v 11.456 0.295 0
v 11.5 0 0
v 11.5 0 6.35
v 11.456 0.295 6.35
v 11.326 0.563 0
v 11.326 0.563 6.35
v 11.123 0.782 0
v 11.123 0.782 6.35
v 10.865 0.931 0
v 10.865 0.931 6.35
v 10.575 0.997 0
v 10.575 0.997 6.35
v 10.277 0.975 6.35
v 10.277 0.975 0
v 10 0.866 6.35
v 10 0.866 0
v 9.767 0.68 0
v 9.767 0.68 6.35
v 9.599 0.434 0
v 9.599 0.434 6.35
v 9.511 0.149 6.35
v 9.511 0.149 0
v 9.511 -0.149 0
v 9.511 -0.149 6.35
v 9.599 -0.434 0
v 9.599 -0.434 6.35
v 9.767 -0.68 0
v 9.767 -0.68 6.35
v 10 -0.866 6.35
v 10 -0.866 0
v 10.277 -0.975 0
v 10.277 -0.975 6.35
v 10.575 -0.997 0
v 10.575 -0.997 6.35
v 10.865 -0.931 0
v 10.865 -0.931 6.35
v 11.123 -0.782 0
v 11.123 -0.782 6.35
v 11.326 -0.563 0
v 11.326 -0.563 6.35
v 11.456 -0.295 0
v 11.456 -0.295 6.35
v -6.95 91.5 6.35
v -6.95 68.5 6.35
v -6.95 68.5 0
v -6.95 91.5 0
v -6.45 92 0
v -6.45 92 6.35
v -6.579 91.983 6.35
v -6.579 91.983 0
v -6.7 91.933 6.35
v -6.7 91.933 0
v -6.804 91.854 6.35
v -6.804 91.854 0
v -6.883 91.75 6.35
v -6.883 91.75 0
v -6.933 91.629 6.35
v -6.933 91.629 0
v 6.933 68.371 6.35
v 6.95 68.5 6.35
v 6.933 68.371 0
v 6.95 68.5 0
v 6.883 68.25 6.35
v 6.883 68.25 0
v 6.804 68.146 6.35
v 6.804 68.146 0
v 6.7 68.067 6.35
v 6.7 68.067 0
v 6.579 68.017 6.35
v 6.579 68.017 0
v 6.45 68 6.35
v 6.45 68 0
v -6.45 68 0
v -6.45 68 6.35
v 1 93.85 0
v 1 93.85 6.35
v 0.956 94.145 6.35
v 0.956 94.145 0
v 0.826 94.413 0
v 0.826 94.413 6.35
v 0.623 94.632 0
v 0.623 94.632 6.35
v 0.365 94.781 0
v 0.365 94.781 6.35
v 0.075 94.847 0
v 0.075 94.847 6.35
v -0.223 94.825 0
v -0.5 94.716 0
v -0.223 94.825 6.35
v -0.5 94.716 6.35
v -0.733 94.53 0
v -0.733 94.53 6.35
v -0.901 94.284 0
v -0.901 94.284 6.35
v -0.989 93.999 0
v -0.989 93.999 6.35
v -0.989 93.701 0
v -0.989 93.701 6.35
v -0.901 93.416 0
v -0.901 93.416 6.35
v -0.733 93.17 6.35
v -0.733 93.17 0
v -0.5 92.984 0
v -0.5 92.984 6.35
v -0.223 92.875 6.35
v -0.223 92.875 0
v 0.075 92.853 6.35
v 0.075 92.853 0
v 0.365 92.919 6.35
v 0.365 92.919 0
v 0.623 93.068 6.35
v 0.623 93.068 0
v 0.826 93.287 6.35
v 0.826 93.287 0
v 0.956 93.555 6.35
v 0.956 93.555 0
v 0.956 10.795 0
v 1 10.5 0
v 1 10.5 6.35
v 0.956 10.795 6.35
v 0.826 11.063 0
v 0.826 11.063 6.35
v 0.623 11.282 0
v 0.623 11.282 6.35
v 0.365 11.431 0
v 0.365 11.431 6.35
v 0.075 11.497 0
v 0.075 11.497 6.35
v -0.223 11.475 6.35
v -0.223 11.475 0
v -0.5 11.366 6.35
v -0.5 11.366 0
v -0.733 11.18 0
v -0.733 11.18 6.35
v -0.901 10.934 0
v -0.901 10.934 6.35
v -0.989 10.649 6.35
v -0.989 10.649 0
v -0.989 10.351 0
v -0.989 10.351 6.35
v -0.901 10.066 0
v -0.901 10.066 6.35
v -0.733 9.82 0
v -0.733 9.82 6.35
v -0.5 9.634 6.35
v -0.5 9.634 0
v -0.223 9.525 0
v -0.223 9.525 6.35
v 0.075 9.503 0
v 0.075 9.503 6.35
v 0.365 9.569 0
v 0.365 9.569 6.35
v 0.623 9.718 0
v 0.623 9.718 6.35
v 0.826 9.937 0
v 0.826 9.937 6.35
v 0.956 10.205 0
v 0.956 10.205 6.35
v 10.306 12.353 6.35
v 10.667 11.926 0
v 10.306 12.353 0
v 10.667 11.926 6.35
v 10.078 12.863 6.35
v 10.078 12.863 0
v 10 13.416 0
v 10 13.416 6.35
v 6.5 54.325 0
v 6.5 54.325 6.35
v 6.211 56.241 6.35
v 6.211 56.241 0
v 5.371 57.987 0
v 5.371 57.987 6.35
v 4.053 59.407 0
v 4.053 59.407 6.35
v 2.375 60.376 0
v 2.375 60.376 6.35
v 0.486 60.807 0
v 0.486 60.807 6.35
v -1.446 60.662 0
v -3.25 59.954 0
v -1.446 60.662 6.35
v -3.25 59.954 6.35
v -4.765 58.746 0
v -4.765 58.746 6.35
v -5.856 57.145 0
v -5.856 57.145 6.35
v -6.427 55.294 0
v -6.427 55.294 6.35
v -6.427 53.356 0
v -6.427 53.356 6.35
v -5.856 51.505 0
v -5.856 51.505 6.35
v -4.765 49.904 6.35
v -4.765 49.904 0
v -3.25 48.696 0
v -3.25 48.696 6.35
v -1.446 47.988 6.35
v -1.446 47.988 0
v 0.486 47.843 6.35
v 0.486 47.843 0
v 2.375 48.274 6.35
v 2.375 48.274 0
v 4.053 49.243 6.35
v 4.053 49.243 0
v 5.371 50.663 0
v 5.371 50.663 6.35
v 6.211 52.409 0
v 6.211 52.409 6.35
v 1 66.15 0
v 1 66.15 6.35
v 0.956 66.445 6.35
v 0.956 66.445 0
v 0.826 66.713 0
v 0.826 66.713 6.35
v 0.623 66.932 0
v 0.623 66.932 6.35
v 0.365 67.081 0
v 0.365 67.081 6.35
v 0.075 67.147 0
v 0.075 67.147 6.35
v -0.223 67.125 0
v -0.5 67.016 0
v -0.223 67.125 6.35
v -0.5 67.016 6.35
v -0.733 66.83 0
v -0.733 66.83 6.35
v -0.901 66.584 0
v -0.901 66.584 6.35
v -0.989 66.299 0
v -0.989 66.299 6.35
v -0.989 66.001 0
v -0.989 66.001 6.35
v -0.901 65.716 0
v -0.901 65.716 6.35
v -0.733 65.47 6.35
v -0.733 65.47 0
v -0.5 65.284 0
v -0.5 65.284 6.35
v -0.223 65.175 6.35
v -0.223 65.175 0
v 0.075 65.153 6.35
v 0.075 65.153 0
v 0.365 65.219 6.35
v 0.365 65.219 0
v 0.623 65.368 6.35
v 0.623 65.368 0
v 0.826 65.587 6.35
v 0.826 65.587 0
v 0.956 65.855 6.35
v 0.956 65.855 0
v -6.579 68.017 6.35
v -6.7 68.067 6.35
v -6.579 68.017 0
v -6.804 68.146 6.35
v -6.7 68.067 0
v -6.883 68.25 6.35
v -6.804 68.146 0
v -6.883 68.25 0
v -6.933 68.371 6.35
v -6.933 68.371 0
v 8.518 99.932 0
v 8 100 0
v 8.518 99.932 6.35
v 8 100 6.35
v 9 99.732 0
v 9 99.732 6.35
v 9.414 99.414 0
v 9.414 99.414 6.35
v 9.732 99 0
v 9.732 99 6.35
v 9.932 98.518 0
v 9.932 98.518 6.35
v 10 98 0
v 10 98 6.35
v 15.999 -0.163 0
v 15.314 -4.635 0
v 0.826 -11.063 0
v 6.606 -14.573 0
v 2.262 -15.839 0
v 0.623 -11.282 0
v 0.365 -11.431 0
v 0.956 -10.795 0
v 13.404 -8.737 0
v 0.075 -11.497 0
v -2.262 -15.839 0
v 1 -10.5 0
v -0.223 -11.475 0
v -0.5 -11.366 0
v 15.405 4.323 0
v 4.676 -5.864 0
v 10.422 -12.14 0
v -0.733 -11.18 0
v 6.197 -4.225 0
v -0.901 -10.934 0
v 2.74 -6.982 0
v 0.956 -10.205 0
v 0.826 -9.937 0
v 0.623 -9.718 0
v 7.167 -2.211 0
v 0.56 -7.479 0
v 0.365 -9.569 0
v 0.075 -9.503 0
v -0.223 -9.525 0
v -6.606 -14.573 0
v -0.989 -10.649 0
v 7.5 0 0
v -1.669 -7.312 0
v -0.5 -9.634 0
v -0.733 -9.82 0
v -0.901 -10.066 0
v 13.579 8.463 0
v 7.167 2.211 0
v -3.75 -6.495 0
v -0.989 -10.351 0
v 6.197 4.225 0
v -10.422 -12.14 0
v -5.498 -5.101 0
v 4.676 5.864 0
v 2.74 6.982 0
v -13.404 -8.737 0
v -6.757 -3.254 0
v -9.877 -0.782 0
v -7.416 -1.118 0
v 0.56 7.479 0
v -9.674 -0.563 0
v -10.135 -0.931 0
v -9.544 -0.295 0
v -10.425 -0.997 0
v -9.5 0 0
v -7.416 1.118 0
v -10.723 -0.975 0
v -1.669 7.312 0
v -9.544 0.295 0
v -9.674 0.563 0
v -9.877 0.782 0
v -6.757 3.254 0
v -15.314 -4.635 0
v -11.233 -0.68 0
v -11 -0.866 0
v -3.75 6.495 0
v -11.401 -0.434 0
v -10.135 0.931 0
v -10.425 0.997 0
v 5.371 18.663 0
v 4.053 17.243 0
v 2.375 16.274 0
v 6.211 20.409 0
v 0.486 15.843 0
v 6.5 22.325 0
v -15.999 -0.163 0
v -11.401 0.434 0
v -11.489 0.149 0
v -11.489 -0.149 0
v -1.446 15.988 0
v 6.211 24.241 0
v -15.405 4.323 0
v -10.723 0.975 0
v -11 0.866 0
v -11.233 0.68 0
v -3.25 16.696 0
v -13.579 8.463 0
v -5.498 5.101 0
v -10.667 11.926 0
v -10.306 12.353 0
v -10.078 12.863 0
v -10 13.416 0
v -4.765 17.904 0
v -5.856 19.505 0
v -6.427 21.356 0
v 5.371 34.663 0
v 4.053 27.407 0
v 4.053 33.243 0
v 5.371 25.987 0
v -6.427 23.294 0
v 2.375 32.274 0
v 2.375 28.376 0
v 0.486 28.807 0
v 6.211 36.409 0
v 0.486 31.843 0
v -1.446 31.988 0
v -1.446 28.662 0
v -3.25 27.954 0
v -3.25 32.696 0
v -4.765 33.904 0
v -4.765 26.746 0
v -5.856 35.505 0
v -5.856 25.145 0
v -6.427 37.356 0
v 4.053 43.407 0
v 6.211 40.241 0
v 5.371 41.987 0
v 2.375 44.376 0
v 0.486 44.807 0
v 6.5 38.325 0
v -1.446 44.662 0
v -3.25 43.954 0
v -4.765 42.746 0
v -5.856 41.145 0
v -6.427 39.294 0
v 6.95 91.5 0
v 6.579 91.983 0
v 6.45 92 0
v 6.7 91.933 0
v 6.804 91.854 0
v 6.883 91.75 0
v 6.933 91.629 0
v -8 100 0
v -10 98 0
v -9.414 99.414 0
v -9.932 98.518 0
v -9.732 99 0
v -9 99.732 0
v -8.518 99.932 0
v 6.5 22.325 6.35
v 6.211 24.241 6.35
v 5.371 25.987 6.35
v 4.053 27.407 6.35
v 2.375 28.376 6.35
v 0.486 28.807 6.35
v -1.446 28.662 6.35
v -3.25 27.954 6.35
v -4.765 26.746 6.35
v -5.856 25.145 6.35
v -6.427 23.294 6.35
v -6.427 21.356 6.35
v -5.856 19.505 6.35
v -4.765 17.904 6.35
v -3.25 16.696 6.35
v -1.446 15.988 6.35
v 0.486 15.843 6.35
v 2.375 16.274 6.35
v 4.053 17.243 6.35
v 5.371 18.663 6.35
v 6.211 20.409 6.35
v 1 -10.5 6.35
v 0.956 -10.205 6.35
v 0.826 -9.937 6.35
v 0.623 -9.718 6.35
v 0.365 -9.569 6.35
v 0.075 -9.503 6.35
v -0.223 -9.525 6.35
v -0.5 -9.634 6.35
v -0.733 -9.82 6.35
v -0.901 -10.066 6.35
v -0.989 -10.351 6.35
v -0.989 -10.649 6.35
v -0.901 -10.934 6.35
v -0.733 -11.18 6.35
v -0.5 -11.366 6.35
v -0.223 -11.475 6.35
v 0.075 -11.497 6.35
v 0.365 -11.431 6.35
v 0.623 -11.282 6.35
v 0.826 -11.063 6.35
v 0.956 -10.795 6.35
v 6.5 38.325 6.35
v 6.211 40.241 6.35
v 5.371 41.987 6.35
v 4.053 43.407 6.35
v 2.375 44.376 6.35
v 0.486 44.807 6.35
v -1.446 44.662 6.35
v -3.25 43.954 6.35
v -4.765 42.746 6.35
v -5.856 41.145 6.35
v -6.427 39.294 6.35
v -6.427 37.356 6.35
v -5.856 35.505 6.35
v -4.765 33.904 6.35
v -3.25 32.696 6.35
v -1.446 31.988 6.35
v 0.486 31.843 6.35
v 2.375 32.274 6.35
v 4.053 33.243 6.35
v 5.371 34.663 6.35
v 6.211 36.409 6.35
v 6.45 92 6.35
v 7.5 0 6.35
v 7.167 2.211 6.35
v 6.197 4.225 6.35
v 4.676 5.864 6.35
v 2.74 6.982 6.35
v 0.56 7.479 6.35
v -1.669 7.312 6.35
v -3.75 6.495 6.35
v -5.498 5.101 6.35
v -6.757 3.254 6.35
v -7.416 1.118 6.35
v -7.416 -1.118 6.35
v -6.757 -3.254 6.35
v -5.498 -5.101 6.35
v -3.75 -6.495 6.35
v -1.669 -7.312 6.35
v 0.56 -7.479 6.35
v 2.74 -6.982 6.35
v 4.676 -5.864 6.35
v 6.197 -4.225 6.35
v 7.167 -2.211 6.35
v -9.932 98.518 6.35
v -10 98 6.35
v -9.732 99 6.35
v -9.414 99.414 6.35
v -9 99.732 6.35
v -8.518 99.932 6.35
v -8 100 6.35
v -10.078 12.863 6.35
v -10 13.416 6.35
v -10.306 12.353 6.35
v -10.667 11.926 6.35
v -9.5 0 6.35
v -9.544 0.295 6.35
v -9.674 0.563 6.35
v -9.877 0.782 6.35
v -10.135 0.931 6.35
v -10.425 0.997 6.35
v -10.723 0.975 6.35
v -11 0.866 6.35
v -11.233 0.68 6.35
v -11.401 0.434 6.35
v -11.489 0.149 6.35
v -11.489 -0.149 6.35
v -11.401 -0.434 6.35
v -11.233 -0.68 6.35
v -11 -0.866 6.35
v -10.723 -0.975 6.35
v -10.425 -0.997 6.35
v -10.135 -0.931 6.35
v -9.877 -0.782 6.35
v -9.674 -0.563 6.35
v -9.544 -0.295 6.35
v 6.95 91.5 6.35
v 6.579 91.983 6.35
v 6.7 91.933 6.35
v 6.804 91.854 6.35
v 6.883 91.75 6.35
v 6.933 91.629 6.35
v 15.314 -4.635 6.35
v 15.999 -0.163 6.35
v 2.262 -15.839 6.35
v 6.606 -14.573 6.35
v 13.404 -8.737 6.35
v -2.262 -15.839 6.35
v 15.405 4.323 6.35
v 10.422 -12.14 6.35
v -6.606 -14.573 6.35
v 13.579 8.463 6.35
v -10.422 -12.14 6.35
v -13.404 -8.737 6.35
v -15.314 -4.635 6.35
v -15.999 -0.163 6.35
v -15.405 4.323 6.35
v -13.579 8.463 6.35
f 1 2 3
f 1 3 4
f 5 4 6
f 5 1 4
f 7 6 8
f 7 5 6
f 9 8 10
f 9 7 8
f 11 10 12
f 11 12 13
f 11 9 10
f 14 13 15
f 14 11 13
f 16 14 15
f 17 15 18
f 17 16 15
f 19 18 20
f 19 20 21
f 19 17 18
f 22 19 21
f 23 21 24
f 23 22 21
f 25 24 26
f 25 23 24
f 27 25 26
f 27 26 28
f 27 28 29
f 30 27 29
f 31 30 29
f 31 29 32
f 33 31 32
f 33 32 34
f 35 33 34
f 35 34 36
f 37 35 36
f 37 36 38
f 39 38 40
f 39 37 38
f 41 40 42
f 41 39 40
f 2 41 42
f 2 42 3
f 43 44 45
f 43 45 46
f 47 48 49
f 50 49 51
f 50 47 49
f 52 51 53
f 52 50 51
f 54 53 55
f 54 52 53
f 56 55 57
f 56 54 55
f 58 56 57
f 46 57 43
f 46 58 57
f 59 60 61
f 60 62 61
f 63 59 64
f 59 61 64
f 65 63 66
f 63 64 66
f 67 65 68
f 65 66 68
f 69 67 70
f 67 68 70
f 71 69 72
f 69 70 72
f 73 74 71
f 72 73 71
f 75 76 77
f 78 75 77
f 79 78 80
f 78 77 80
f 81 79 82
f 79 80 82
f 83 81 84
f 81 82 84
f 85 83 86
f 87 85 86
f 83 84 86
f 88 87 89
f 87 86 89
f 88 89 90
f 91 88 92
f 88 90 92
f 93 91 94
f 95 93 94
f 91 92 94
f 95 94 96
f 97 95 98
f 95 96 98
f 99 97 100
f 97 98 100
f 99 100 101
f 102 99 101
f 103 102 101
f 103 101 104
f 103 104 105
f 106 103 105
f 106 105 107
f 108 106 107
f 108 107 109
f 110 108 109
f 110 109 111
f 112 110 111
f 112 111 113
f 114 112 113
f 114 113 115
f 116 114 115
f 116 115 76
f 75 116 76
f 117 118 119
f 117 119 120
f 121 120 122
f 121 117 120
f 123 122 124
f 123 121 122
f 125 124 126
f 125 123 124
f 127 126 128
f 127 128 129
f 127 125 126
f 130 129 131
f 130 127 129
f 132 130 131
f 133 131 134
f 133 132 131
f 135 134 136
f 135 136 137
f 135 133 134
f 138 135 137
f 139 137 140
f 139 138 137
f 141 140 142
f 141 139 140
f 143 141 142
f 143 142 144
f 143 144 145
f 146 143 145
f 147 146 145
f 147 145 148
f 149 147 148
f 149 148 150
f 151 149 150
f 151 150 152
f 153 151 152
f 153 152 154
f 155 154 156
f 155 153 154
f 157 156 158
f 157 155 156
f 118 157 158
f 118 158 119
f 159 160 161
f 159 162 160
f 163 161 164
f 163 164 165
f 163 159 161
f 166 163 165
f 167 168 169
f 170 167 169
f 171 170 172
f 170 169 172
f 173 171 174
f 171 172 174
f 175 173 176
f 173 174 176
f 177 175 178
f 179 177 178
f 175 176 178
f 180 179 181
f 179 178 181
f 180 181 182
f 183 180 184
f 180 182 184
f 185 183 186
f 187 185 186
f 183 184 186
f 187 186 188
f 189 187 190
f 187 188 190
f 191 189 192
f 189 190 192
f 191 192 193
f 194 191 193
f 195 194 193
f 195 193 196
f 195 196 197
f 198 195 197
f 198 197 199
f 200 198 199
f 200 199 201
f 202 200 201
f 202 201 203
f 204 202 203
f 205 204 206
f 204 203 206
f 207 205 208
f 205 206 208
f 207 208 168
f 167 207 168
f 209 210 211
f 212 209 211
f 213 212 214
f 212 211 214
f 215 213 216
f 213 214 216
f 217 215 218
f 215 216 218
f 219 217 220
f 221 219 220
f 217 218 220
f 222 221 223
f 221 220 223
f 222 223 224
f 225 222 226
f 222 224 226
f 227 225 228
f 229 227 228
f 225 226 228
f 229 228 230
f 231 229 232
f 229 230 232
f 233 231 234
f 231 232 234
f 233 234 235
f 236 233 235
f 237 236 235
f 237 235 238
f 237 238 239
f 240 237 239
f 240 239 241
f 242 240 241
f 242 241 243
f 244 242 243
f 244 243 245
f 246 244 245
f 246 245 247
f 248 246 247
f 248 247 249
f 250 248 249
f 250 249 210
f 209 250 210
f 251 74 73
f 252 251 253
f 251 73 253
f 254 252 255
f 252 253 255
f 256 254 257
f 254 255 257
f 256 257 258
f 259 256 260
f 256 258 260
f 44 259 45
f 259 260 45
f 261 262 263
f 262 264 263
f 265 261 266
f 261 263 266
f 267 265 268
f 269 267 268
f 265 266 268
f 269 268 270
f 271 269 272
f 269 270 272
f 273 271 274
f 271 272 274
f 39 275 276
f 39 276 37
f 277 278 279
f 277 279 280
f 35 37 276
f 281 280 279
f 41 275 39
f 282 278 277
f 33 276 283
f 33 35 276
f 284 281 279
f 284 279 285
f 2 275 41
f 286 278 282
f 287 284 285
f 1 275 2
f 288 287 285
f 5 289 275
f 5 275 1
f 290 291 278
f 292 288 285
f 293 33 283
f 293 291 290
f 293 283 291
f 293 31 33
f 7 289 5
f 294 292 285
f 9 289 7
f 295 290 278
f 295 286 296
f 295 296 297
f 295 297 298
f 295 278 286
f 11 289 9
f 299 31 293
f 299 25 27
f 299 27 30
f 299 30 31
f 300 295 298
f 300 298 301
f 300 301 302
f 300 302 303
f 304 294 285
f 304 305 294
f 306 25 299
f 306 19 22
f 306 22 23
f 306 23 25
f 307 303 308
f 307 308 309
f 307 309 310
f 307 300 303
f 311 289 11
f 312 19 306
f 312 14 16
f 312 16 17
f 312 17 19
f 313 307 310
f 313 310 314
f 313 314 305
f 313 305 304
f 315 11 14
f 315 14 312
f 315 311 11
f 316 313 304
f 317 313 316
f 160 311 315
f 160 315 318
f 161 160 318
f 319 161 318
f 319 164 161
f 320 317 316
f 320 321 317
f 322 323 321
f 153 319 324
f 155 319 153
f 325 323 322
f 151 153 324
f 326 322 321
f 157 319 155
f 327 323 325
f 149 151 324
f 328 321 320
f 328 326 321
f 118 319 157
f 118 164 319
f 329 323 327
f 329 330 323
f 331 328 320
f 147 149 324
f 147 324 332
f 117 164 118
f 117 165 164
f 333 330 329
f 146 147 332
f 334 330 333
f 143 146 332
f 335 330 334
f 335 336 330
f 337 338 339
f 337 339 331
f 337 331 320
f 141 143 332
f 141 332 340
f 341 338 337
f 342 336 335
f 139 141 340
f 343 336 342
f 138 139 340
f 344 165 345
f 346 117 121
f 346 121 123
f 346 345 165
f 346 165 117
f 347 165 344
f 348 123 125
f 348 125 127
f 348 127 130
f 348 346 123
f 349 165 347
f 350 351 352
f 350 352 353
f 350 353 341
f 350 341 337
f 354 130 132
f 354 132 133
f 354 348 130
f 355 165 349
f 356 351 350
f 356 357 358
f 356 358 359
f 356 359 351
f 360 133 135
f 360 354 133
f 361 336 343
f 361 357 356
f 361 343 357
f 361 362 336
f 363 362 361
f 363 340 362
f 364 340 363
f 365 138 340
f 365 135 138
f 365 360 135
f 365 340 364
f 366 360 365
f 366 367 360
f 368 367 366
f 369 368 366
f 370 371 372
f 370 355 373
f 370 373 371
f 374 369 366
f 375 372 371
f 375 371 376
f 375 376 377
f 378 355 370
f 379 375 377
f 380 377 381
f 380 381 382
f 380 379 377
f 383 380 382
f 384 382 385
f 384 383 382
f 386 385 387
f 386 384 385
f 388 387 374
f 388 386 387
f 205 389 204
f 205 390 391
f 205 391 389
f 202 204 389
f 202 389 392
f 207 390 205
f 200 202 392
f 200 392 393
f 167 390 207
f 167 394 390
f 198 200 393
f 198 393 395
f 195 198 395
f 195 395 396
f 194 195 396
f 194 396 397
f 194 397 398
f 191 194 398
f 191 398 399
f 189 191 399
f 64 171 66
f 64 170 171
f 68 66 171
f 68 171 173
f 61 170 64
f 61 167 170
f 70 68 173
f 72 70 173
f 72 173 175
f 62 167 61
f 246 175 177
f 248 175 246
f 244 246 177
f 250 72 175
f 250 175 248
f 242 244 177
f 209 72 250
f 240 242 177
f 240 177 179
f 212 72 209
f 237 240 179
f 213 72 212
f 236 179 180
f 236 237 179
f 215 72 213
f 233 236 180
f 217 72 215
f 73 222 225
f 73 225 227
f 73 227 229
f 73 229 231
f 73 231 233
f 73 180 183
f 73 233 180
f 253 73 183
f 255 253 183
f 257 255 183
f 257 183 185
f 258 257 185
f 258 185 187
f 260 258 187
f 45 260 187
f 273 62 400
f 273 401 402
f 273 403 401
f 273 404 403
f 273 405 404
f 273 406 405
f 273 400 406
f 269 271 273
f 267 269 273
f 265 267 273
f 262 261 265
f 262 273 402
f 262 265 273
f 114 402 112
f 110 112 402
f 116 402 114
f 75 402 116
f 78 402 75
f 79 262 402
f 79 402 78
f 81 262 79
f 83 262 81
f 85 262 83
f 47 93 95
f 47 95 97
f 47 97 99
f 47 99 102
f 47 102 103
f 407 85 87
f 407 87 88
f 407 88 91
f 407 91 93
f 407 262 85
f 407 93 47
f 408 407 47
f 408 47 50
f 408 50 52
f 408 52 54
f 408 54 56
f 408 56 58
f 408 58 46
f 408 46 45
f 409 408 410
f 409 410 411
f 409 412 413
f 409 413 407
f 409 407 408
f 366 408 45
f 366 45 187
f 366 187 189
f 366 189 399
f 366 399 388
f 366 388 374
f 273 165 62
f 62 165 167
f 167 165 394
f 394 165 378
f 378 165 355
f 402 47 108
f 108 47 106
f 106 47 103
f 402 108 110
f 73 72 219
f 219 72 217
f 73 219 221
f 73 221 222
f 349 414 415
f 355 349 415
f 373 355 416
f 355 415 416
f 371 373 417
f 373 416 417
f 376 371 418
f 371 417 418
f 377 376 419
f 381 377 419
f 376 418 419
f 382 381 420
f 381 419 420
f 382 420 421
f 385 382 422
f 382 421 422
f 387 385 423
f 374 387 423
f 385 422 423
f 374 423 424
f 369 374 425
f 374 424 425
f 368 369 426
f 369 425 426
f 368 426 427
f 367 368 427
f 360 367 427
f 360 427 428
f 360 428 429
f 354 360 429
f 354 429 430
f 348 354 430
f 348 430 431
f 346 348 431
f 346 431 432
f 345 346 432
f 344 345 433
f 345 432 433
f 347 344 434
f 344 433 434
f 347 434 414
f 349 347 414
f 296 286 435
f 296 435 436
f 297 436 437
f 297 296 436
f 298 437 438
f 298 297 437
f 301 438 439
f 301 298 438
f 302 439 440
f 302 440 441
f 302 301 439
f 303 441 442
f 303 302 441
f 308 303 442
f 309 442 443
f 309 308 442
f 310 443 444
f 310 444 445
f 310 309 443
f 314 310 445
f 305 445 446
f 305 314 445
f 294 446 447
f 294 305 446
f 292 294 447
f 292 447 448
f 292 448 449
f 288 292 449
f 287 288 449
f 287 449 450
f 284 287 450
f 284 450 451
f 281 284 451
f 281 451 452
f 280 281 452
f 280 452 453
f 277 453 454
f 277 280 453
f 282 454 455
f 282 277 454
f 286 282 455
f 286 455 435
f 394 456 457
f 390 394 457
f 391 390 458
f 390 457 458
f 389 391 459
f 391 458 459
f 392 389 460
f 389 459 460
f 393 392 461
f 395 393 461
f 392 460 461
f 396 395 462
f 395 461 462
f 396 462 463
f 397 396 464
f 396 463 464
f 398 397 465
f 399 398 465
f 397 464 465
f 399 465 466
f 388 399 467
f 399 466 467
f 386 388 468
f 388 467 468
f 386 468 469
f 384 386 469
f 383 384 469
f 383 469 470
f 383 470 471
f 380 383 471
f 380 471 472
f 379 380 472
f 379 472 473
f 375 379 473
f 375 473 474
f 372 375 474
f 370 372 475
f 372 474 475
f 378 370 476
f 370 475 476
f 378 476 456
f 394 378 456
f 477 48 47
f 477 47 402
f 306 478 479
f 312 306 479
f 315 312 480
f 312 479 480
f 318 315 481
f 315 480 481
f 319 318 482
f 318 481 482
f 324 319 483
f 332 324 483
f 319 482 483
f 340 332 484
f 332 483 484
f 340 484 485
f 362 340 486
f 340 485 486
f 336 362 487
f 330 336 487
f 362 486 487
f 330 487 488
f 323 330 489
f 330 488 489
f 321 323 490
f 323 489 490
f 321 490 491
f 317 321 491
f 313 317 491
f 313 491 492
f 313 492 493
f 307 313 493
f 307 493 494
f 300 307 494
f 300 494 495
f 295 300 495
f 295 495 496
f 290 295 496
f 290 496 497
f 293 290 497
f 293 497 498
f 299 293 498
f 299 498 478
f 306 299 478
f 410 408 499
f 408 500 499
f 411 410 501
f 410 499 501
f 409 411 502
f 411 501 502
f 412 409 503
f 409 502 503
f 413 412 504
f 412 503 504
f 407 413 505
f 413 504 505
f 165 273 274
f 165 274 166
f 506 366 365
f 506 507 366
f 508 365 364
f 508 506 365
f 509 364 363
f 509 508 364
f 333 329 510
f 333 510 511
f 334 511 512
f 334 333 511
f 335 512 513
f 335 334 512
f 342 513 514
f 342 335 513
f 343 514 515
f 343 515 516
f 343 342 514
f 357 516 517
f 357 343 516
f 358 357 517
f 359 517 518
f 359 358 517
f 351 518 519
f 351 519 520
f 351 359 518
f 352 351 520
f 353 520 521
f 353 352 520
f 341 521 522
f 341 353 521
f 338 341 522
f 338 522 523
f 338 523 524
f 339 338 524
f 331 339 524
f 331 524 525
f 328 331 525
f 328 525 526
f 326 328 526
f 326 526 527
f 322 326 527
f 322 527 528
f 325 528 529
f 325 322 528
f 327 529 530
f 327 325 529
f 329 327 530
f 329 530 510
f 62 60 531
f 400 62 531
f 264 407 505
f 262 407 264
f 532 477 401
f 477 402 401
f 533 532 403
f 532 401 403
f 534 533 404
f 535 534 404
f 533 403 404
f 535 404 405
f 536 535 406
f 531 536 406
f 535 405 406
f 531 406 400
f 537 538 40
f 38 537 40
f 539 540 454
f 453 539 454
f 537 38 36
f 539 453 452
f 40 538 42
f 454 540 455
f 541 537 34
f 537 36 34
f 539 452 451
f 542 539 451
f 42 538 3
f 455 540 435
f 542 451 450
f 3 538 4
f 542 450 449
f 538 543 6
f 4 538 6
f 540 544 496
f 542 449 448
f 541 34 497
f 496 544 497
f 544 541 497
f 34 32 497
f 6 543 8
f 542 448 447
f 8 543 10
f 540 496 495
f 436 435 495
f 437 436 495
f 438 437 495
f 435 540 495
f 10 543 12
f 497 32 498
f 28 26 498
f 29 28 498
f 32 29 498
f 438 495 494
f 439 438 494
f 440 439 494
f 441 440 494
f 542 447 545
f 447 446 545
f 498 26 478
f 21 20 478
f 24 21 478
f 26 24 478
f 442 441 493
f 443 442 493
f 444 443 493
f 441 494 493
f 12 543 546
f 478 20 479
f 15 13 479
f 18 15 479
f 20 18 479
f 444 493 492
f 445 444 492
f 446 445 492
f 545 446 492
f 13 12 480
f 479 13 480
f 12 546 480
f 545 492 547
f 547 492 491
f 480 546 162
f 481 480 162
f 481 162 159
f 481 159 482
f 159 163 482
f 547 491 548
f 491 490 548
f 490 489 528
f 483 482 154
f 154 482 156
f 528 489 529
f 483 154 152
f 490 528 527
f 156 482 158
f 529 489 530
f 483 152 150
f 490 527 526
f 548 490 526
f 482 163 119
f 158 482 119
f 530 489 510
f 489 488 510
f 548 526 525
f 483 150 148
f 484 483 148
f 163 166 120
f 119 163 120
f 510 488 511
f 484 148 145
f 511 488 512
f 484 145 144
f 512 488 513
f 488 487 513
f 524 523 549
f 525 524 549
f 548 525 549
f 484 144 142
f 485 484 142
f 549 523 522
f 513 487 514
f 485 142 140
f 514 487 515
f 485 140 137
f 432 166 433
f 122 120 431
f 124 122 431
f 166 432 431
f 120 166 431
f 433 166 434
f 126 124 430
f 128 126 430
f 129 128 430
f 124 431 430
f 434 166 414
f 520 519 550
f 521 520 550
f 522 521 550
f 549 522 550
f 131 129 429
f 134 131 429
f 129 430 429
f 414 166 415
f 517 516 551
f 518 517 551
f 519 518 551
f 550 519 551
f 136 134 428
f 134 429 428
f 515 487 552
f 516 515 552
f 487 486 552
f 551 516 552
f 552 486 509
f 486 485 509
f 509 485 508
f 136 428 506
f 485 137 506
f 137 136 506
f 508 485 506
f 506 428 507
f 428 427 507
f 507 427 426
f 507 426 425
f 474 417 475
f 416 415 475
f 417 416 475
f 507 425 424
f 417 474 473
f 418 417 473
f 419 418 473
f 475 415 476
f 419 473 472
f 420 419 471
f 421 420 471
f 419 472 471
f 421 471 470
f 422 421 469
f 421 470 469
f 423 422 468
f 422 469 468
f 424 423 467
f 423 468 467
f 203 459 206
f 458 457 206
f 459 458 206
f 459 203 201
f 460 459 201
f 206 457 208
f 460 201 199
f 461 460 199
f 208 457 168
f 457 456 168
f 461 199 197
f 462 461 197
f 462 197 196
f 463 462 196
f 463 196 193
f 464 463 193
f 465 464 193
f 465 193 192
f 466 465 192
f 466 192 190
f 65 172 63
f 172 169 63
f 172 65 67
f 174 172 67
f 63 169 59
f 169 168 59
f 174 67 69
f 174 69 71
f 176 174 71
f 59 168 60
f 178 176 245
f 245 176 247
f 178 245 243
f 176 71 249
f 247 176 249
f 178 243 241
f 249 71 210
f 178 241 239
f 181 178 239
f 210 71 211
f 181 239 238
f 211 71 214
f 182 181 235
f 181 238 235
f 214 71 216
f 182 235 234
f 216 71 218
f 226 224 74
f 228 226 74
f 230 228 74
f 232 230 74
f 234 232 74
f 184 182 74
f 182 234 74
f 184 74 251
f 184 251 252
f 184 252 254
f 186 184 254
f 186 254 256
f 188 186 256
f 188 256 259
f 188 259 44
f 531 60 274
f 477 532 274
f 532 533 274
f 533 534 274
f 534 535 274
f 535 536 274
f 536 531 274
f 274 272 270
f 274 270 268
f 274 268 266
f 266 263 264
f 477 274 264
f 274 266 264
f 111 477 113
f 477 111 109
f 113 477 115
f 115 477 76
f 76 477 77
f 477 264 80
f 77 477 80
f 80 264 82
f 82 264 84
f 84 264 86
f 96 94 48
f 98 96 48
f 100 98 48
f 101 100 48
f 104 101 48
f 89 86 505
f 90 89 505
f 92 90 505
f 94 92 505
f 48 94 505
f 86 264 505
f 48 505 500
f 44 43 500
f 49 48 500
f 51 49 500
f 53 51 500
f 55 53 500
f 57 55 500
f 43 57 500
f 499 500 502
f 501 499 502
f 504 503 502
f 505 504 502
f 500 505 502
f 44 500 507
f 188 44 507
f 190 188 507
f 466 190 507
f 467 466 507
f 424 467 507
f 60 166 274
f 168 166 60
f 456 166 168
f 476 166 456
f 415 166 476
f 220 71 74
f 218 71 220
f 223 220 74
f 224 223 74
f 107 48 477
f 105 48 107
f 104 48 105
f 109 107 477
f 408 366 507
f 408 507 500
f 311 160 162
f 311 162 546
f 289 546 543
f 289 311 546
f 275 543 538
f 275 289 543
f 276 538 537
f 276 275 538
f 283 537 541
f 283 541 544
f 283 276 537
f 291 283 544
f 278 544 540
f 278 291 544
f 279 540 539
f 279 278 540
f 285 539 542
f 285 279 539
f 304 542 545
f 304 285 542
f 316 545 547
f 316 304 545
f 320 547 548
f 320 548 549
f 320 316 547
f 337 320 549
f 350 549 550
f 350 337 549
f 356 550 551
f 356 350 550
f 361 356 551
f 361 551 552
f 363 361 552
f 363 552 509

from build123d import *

# Parameters (mm, degrees)
SKETCH1_R           = 1
BOSS_EXTRUDE1_DEPTH = 6.35
SKETCH2_R           = 1
SKETCH2_W           = 13.9
SKETCH2_H           = 24
CUT_EXTRUDE1_DEPTH  = 102.470796291
FILLET1_R           = 0.5
FILLET2_R           = 2
SKETCH3_R           = 6.5
CUT_EXTRUDE2_DEPTH  = 6.35
SKETCH4_R           = 7.5
CUT_EXTRUDE3_DEPTH  = 102.470796291


with BuildPart() as part:
    # Sketch1 → Boss-Extrude1 (new body)
    with BuildSketch(Plane.XY):
        with BuildLine():
            Line((-10, 12.489995997), (-10, 100))
            Line((-10, 100), (10, 100))
            Line((10, 100), (10, 12.489995997))
            ThreePointArc((10, 12.489995997), (0, -16), (-10, 12.489995997))
        make_face()
        with Locations((-10.5, 0)):
            Circle(SKETCH1_R, mode=Mode.SUBTRACT)
        with Locations((0, 10.5)):
            Circle(SKETCH1_R, mode=Mode.SUBTRACT)
        with Locations((10.5, 0)):
            Circle(SKETCH1_R, mode=Mode.SUBTRACT)
        with Locations((0, -10.5)):
            Circle(SKETCH1_R, mode=Mode.SUBTRACT)
    extrude(amount=BOSS_EXTRUDE1_DEPTH)

    # Sketch2 → Cut-Extrude1 (cut, through all)
    with BuildSketch(Plane.XY.offset(6.35)):
        with Locations((0, 93.85)):
            Circle(SKETCH2_R)
        with Locations((0, 66.15)):
            Circle(SKETCH2_R)
        with Locations((0, 80)):
            Rectangle(SKETCH2_W, SKETCH2_H)
    extrude(amount=-CUT_EXTRUDE1_DEPTH, mode=Mode.SUBTRACT)

    # Fillet1
    fillet1_edges = [part.edges().sort_by_distance(p)[0] for p in [
        (6.95, 68, 3.175),
        (-6.95, 68, 3.175),
        (-6.95, 92, 3.175),
        (6.95, 92, 3.175),
    ]]
    fillet(fillet1_edges, radius=FILLET1_R)

    # Fillet2
    fillet2_edges = [part.edges().sort_by_distance(p)[0] for p in [
        (-10, 12.489995997, 3.175),
        (-10, 100, 3.175),
        (10, 100, 3.175),
        (10, 12.489995997, 3.175),
    ]]
    fillet(fillet2_edges, radius=FILLET2_R)

    # Sketch3 → Cut-Extrude2 (cut)
    with BuildSketch(Plane.XY.offset(6.35)):
        with Locations((0, 38.325)):
            Circle(SKETCH3_R)
        with Locations((0, 54.325)):
            Circle(SKETCH3_R)
        with Locations((0, 22.325)):
            Circle(SKETCH3_R)
    extrude(amount=-CUT_EXTRUDE2_DEPTH, mode=Mode.SUBTRACT)

    # Sketch4 → Cut-Extrude3 (cut, through all)
    with BuildSketch(Plane.XY.offset(6.35)):
        Circle(SKETCH4_R)
    extrude(amount=-CUT_EXTRUDE3_DEPTH, mode=Mode.SUBTRACT)


solid = part.part
